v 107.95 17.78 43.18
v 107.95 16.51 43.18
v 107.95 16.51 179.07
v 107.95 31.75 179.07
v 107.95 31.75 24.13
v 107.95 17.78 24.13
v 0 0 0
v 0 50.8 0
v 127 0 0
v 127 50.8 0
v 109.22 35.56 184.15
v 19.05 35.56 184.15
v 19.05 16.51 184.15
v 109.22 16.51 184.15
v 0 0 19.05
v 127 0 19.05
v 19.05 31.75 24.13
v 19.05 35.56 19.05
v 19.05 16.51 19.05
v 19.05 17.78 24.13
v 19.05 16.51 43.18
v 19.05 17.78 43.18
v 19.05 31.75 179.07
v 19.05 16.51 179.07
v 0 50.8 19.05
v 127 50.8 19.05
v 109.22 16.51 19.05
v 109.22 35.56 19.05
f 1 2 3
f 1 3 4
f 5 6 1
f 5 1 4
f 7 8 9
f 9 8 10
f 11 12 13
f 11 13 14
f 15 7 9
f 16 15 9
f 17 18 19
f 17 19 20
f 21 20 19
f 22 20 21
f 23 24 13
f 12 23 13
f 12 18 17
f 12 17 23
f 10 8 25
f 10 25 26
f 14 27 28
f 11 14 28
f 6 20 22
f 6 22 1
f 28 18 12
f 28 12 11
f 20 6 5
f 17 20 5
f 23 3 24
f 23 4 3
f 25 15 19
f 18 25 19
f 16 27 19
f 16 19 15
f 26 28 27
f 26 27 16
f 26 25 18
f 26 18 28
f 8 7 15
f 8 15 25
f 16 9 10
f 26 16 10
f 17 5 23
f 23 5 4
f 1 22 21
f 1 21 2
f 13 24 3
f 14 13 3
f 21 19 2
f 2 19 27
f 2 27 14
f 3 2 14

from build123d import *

# Parameters (mm, degrees)
F0_W      = 127
F0_H      = 50.8
F1_DEPTH  = 19.05
F2_W      = 88.9
F2_H      = 17.78
F3_DEPTH  = 165.1
F4_W      = 13.97
F4_H      = 154.94
F5_DEPTH  = 100.584
F6_W      = 88.9
F6_H      = 1.27
F7_DEPTH  = 24.13
F8_W      = 1.27
F8_H      = 19.05
F9_DEPTH  = 165.1
F10_DEPTH = 1.27


with BuildPart() as f1:
    # F0 (on Top) → F1 (new body)
    with BuildSketch(Plane.XY):
        with Locations((63.5, 25.4)):
            Rectangle(F0_W, F0_H)
    extrude(amount=F1_DEPTH)

    # F2 (on face) → F3 (join)
    with BuildSketch(Plane.XY.offset(19.05)):
        with Locations((63.5, 26.67)):
            Rectangle(F2_W, F2_H)
    extrude(amount=F3_DEPTH)

    # F4 (on face) → F5 (cut)
    with BuildSketch(Plane.YZ.offset(107.95)):
        with Locations((24.765, 101.6)):
            Rectangle(F4_W, F4_H)
    extrude(amount=-F5_DEPTH, mode=Mode.SUBTRACT)

    # F6 (on face) → F7 (join)
    with BuildSketch(Plane.XY.offset(19.05)):
        with Locations((63.5, 17.145)):
            Rectangle(F6_W, F6_H)
    extrude(amount=F7_DEPTH)

    # F8 (on face) → F9 (join)
    with BuildSketch(Plane.XY.offset(19.05)):
        with Locations((108.585, 26.035)):
            Rectangle(F8_W, F8_H)
    extrude(amount=F9_DEPTH)

    # F10 (add): a face of the model
    f10_faces = [f1.faces().sort_by_distance(p)[0] for p in [
        (63.5, 17.78, 181.61),
    ]]
    extrude(f10_faces, amount=F10_DEPTH)


solid = f1.part
